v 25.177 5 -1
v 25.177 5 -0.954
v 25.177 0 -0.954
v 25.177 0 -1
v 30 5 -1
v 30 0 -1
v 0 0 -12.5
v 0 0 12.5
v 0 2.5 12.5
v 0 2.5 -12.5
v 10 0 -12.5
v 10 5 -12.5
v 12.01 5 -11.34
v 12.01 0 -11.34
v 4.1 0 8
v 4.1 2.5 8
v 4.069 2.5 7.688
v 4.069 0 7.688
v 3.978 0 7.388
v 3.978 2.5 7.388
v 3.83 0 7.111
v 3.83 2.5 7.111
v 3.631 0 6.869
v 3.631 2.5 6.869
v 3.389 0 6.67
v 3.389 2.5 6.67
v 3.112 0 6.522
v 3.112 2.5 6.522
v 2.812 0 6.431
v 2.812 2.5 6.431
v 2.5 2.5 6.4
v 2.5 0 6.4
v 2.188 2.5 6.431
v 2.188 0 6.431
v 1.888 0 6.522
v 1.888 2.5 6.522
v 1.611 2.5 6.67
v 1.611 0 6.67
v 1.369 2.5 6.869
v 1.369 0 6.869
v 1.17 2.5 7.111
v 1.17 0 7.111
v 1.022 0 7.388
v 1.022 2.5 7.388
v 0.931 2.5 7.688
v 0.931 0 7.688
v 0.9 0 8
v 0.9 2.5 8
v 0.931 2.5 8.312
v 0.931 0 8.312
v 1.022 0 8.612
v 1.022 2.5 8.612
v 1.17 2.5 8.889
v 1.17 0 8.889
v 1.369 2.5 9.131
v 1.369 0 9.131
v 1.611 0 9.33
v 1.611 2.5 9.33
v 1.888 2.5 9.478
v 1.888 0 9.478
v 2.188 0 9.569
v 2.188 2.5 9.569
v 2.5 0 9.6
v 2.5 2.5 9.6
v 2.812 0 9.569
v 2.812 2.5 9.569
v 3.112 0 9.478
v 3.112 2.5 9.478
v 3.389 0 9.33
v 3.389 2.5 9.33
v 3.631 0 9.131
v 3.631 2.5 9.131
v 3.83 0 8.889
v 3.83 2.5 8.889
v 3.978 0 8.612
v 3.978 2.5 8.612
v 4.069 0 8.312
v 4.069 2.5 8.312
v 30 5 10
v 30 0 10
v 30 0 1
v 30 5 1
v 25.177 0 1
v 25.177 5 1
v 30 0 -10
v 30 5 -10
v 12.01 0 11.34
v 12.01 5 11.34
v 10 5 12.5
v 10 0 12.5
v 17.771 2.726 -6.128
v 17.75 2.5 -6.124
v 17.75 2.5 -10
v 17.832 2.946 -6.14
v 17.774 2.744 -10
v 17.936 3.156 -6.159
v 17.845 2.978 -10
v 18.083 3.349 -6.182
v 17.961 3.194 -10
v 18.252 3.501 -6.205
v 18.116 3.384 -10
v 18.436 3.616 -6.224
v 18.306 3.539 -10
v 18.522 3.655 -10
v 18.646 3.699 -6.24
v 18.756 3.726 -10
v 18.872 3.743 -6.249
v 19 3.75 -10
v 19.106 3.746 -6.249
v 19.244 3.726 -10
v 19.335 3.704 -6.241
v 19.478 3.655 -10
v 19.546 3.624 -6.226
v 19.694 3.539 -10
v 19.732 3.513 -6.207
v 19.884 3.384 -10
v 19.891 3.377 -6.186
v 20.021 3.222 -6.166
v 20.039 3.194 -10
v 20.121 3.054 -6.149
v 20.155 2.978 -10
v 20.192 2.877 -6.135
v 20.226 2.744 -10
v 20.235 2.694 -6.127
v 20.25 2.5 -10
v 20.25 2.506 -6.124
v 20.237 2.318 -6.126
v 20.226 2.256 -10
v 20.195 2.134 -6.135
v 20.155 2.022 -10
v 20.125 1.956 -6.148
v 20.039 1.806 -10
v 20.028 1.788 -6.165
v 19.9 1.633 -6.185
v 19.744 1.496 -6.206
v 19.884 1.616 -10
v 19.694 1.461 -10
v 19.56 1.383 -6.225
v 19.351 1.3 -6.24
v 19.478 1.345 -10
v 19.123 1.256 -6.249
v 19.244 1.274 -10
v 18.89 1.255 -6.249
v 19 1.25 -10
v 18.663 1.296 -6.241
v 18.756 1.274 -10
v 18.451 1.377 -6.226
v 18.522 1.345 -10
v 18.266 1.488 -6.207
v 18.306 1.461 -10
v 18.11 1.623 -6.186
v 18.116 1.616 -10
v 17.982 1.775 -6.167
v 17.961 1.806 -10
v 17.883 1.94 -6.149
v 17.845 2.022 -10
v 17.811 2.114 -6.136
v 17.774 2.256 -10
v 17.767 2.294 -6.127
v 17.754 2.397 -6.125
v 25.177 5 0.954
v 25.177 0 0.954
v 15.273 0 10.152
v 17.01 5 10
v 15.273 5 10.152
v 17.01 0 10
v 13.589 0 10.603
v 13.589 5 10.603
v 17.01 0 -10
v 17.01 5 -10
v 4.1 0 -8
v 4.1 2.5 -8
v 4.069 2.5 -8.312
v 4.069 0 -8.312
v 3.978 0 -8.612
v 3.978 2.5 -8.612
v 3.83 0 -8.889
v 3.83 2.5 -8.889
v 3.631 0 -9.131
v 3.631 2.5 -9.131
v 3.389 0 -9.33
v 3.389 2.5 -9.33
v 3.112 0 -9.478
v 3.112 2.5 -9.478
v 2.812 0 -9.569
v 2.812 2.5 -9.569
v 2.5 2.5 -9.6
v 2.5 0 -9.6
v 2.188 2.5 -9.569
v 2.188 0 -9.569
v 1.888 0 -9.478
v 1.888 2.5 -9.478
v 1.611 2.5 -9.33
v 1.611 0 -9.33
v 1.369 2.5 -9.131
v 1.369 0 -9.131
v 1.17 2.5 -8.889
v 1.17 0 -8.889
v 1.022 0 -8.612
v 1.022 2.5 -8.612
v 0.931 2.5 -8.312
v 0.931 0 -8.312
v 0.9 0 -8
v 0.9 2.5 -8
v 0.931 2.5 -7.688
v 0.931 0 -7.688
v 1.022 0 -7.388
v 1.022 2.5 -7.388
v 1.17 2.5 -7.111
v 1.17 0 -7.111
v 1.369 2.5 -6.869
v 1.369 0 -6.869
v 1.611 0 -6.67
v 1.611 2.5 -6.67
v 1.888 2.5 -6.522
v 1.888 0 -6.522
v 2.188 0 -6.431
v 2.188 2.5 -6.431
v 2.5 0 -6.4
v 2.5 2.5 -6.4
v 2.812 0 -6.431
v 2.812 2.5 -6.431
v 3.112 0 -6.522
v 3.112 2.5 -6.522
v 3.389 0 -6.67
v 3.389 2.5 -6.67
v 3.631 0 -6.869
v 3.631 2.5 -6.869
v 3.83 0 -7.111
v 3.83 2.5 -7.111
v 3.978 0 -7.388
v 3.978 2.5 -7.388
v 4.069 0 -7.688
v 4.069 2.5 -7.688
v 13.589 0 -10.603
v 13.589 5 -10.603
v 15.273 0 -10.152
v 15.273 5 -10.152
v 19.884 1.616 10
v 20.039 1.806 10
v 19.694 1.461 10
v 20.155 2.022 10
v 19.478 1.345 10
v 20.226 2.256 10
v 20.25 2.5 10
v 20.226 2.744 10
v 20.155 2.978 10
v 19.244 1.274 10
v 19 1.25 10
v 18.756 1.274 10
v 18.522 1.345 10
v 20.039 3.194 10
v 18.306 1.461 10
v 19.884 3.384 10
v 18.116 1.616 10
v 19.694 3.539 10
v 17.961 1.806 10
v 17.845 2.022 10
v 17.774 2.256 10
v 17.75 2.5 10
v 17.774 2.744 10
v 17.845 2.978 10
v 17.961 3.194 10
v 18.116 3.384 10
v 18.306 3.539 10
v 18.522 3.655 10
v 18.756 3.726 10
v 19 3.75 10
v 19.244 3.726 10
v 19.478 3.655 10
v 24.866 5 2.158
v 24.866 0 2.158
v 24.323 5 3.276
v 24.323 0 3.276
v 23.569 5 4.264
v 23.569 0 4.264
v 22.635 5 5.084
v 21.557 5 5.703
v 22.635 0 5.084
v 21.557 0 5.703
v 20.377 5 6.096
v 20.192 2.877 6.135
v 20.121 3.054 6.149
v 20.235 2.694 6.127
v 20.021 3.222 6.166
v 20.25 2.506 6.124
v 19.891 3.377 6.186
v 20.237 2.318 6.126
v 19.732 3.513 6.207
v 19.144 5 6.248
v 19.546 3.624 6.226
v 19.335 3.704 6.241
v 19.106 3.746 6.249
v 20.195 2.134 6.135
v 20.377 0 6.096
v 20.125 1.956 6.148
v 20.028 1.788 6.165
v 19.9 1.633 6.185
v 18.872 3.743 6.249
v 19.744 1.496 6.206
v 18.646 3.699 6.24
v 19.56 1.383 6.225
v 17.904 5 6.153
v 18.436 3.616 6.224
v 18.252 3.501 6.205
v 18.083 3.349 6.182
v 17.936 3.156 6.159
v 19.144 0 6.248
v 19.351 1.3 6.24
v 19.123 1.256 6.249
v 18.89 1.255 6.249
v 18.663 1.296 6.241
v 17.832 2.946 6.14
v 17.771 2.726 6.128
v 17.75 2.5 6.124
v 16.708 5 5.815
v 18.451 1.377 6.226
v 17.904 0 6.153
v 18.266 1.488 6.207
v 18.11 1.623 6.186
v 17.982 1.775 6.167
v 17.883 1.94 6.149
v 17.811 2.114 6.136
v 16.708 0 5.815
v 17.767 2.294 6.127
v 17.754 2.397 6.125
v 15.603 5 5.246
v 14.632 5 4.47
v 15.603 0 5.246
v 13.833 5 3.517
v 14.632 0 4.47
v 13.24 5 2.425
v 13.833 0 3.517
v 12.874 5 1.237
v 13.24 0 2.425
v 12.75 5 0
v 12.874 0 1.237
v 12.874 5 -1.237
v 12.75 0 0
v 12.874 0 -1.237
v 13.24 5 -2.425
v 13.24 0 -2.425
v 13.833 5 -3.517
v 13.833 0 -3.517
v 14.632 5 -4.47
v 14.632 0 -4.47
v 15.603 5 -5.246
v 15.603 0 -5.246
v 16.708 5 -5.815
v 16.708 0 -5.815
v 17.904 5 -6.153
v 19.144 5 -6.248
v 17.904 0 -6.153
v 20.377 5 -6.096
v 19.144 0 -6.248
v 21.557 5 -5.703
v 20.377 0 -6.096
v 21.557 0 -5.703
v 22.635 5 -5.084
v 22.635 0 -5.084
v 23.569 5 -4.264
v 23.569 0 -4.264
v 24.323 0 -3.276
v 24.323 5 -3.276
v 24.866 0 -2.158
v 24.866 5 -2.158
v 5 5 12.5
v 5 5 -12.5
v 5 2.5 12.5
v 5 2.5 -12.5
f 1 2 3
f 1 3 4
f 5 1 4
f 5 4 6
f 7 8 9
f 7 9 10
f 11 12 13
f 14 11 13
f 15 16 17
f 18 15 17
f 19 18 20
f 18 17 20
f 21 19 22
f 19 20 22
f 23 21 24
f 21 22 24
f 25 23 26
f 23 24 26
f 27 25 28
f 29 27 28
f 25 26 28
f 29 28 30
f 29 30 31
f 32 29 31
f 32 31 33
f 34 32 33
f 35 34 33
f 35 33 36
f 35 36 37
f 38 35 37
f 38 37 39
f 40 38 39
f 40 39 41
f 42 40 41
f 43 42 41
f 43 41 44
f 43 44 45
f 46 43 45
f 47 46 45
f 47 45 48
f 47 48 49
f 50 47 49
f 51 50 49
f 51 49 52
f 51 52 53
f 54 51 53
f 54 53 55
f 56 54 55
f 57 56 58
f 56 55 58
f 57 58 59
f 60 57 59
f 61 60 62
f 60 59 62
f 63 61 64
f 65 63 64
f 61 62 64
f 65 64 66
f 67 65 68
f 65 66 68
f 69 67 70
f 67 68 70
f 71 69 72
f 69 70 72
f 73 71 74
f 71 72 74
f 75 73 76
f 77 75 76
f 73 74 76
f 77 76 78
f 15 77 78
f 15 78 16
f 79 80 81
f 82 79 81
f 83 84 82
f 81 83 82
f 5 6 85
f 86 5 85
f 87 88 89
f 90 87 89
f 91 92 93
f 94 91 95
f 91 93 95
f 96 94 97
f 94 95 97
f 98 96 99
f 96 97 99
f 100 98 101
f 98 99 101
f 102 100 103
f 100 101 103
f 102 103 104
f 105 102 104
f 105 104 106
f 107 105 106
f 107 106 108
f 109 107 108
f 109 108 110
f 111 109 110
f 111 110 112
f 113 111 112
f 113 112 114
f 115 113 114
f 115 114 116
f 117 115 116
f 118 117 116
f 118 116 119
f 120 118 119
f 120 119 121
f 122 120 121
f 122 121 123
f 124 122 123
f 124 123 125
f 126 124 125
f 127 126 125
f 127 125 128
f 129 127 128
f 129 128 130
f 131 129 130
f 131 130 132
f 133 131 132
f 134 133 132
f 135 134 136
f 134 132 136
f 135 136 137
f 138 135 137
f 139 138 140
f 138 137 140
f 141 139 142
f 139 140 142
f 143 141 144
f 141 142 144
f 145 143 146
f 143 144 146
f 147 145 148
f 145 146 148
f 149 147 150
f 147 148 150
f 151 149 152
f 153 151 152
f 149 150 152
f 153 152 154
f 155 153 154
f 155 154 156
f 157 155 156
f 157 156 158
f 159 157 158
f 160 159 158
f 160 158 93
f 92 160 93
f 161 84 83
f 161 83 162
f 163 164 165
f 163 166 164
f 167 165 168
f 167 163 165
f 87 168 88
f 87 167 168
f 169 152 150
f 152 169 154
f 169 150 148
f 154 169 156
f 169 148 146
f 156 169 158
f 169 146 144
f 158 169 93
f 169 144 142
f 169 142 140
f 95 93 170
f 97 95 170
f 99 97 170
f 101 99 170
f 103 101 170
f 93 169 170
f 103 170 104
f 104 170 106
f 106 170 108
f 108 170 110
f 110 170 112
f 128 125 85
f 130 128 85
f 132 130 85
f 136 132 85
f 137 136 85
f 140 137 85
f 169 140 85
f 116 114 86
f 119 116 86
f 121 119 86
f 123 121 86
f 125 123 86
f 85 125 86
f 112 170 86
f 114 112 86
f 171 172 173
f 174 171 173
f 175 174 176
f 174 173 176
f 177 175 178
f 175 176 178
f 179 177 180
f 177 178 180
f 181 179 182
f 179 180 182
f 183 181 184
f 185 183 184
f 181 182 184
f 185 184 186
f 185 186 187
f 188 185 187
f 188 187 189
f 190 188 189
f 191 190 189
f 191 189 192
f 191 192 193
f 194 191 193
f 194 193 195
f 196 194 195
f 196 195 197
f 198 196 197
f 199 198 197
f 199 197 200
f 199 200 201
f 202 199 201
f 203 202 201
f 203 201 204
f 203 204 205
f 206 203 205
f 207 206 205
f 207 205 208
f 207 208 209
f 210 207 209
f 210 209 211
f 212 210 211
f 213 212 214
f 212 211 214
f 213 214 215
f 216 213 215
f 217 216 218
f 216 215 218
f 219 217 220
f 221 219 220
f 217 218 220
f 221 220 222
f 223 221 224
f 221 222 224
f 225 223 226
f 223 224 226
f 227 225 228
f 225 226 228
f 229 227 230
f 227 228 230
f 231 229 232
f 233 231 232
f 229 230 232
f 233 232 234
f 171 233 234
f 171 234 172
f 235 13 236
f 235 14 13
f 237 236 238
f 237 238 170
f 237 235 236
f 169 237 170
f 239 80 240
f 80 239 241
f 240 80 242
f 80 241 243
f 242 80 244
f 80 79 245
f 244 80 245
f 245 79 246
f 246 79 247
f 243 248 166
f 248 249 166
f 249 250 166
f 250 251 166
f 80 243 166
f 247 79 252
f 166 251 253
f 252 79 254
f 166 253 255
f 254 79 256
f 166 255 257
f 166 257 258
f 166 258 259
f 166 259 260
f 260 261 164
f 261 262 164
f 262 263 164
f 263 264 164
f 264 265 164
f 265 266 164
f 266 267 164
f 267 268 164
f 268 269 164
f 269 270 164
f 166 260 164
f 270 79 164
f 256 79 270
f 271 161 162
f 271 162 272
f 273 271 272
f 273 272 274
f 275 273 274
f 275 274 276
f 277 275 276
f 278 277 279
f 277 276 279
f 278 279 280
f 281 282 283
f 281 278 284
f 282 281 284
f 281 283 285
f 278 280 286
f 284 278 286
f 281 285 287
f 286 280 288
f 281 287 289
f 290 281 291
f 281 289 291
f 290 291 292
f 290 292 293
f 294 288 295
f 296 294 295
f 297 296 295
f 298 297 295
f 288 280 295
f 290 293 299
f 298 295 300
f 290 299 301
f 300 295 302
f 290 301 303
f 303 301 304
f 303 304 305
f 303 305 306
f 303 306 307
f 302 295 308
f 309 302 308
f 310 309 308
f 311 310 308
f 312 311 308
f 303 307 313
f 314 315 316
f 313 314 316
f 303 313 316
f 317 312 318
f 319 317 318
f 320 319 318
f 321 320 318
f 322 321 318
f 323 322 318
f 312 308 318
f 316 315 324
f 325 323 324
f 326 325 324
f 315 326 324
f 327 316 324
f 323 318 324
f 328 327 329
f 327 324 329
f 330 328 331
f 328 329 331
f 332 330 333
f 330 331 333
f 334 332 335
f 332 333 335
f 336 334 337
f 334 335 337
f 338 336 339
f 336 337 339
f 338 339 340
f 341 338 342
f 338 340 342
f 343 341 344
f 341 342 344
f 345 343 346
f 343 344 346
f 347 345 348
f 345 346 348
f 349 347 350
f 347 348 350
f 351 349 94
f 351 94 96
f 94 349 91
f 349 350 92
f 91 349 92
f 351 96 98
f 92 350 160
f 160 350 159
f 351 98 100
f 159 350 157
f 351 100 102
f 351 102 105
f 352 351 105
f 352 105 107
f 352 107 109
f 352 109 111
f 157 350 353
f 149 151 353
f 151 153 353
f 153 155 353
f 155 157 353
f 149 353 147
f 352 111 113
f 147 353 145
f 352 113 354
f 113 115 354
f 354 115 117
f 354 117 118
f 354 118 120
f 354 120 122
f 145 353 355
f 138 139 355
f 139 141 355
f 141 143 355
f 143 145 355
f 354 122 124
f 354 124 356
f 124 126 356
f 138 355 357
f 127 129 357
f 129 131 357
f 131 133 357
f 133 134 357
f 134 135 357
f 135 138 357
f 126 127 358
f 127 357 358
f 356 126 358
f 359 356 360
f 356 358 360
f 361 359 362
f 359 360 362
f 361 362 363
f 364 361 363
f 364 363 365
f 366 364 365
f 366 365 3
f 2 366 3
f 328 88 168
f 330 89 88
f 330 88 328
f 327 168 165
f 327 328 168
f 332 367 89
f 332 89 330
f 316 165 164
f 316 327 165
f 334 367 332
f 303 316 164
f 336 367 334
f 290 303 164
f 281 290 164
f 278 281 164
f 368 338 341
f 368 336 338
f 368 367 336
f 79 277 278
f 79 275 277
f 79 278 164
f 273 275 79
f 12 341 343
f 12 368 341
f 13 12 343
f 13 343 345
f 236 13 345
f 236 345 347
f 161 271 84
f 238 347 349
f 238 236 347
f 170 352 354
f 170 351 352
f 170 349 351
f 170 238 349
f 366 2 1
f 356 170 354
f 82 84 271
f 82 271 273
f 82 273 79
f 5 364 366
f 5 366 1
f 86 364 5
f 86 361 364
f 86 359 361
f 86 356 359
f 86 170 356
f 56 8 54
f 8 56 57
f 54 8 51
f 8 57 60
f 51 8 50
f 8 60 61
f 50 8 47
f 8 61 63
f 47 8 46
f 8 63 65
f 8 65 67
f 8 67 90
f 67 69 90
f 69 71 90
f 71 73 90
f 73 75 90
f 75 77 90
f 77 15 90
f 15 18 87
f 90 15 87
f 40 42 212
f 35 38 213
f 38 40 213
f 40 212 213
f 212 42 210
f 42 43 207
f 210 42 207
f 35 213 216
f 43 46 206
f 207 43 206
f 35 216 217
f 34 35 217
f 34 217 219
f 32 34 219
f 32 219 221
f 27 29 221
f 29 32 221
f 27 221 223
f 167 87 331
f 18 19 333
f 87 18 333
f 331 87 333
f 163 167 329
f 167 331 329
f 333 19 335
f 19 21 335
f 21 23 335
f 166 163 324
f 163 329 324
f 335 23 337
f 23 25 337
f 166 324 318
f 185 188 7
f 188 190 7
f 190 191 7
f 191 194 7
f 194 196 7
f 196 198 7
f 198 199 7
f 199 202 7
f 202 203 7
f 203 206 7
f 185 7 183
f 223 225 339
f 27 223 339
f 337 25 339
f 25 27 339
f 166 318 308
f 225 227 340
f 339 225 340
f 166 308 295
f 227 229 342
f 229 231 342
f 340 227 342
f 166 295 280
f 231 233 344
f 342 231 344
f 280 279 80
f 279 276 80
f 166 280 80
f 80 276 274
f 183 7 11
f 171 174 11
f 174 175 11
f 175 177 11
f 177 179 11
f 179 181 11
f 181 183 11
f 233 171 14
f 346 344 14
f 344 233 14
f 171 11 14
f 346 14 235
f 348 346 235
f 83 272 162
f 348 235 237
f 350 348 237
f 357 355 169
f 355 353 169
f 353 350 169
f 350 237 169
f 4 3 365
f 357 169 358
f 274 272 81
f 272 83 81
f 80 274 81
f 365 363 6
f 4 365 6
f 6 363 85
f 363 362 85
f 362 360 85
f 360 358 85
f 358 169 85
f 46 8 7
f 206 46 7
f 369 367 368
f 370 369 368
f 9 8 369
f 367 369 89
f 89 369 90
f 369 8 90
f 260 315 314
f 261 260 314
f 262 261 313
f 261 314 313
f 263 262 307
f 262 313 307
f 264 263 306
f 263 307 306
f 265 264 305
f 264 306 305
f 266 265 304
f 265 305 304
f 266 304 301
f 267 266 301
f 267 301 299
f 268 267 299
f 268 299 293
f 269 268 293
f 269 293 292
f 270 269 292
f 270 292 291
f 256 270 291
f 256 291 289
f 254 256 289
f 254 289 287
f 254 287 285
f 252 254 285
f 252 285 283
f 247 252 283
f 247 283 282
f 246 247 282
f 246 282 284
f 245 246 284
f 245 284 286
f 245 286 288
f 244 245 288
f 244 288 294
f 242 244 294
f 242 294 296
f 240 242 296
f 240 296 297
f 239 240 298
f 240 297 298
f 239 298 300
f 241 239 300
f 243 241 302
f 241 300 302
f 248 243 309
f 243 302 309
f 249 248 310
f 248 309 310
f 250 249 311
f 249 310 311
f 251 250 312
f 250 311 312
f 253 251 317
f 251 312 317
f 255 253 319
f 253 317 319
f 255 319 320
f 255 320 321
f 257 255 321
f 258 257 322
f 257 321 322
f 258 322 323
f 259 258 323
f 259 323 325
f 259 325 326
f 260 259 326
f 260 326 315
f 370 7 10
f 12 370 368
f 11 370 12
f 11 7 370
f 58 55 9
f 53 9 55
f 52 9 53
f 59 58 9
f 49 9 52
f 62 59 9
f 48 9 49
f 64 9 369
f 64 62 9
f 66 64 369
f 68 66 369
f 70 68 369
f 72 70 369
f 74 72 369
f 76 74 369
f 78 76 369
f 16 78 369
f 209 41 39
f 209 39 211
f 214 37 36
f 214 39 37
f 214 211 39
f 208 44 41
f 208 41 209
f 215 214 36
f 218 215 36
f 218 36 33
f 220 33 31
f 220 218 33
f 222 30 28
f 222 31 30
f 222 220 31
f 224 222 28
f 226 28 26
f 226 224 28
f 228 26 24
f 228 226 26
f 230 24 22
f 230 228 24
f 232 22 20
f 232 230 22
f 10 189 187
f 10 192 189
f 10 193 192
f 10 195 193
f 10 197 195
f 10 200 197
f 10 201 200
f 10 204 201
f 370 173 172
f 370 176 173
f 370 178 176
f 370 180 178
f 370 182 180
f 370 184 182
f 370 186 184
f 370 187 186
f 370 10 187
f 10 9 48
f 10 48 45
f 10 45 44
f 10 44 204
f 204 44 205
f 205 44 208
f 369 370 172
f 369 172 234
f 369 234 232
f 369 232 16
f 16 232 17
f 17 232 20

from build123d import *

# Parameters (mm, degrees)
SKIZZE1_W                              = 30
SKIZZE1_H                              = 25
AUFSATZ_LINEAR_AUSTRAGEN1_DEPTH        = 5
SKIZZE2_W                              = 5
SKIZZE2_H                              = 25
SCHNITT_LINEAR_AUSTRAGEN1_DEPTH        = 2.5
F_12_5_12_5_DURCHMESSER_BOHRUNG1_D     = 12.5
F_12_5_12_5_DURCHMESSER_BOHRUNG1_DEPTH = 5
F_12_5_12_5_DURCHMESSER_BOHRUNG1_TIP   = 3.755378869
DURCHGANGSLOCH_F_R_M31_D               = 3.2
DURCHGANGSLOCH_F_R_M31_DEPTH           = 5
DURCHGANGSLOCH_F_R_M31_TIP             = 0.96137699
SCHNITT_LINEAR_AUSTRAGEN2_DEPTH        = 33.882366095
SKIZZE8_W                              = 4.823257392
SKIZZE8_H                              = 2
SCHNITT_LINEAR_AUSTRAGEN3_DEPTH        = 10
VERRUNDUNG1_R                          = 10
M3_GEWINDEBOHRUNG2_D                   = 2.5


with BuildPart() as part:
    # Skizze1 → Aufsatz-Linear austragen1 (new body)
    with BuildSketch(Plane(origin=(0, 0, 0), x_dir=(1, 0, 0), z_dir=(0, 1, 0))):
        with Locations((15, 0)):
            Rectangle(SKIZZE1_W, SKIZZE1_H)
    extrude(amount=AUFSATZ_LINEAR_AUSTRAGEN1_DEPTH)

    # Skizze2 → Schnitt-Linear austragen1 (cut)
    with BuildSketch(Plane(origin=(0, 5, 0), x_dir=(1, 0, 0), z_dir=(0, 1, 0))):
        with Locations((2.5, 0)):
            Rectangle(SKIZZE2_W, SKIZZE2_H)
    extrude(amount=-SCHNITT_LINEAR_AUSTRAGEN1_DEPTH, mode=Mode.SUBTRACT)

    # Ø12.5 (12.5) Durchmesser Bohrung1
    with Locations(Plane(origin=(0, 5, 0), x_dir=(1, 0, 0), z_dir=(0, 1, 0))):
        with Locations((19, 0)):
            Hole(F_12_5_12_5_DURCHMESSER_BOHRUNG1_D / 2, depth=F_12_5_12_5_DURCHMESSER_BOHRUNG1_DEPTH)
            with Locations((0, 0, -(F_12_5_12_5_DURCHMESSER_BOHRUNG1_DEPTH + F_12_5_12_5_DURCHMESSER_BOHRUNG1_TIP / 2))):  # 118° drill point
                Cone(0, F_12_5_12_5_DURCHMESSER_BOHRUNG1_D / 2, F_12_5_12_5_DURCHMESSER_BOHRUNG1_TIP, mode=Mode.SUBTRACT)

    # Durchgangsloch für M31
    with Locations(Plane(origin=(0, 0, 0), x_dir=(-1, 0, 0), z_dir=(0, -1, 0))):
        with Locations((-2.5, 8), (-2.5, -8)):
            Hole(DURCHGANGSLOCH_F_R_M31_D / 2, depth=DURCHGANGSLOCH_F_R_M31_DEPTH)
            with Locations((0, 0, -(DURCHGANGSLOCH_F_R_M31_DEPTH + DURCHGANGSLOCH_F_R_M31_TIP / 2))):  # 118° drill point
                Cone(0, DURCHGANGSLOCH_F_R_M31_D / 2, DURCHGANGSLOCH_F_R_M31_TIP, mode=Mode.SUBTRACT)

    # Skizze7 → Schnitt-Linear austragen2 (cut, through all)
    with BuildSketch(Plane(origin=(0, 5, 0), x_dir=(1, 0, 0), z_dir=(0, 1, 0))):
        Polygon((10, 12.5), (14.330127019, 10), (30, 10), (30, 12.5), align=None)
        Polygon((30, -10), (14.330127019, -10), (10, -12.5), (30, -12.5), align=None)
    extrude(amount=-SCHNITT_LINEAR_AUSTRAGEN2_DEPTH, mode=Mode.SUBTRACT)

    # Skizze8 → Schnitt-Linear austragen3 (cut)
    with BuildSketch(Plane(origin=(0, 5, 0), x_dir=(1, 0, 0), z_dir=(0, 1, 0))):
        with Locations((27.588371304, 0)):
            Rectangle(SKIZZE8_W, SKIZZE8_H)
    extrude(amount=-SCHNITT_LINEAR_AUSTRAGEN3_DEPTH, mode=Mode.SUBTRACT)

    # Verrundung1
    verrundung1_edges = [part.edges().sort_by_distance(p)[0] for p in [
        (14.330127019, 2.5, -10),
        (14.330127019, 2.5, 10),
    ]]
    fillet(verrundung1_edges, radius=VERRUNDUNG1_R)

    # M3 Gewindebohrung2 (through all)
    with Locations(Plane.XY.offset(10)):
        with Locations((19, 2.5)):
            Hole(M3_GEWINDEBOHRUNG2_D / 2)


solid = part.part
